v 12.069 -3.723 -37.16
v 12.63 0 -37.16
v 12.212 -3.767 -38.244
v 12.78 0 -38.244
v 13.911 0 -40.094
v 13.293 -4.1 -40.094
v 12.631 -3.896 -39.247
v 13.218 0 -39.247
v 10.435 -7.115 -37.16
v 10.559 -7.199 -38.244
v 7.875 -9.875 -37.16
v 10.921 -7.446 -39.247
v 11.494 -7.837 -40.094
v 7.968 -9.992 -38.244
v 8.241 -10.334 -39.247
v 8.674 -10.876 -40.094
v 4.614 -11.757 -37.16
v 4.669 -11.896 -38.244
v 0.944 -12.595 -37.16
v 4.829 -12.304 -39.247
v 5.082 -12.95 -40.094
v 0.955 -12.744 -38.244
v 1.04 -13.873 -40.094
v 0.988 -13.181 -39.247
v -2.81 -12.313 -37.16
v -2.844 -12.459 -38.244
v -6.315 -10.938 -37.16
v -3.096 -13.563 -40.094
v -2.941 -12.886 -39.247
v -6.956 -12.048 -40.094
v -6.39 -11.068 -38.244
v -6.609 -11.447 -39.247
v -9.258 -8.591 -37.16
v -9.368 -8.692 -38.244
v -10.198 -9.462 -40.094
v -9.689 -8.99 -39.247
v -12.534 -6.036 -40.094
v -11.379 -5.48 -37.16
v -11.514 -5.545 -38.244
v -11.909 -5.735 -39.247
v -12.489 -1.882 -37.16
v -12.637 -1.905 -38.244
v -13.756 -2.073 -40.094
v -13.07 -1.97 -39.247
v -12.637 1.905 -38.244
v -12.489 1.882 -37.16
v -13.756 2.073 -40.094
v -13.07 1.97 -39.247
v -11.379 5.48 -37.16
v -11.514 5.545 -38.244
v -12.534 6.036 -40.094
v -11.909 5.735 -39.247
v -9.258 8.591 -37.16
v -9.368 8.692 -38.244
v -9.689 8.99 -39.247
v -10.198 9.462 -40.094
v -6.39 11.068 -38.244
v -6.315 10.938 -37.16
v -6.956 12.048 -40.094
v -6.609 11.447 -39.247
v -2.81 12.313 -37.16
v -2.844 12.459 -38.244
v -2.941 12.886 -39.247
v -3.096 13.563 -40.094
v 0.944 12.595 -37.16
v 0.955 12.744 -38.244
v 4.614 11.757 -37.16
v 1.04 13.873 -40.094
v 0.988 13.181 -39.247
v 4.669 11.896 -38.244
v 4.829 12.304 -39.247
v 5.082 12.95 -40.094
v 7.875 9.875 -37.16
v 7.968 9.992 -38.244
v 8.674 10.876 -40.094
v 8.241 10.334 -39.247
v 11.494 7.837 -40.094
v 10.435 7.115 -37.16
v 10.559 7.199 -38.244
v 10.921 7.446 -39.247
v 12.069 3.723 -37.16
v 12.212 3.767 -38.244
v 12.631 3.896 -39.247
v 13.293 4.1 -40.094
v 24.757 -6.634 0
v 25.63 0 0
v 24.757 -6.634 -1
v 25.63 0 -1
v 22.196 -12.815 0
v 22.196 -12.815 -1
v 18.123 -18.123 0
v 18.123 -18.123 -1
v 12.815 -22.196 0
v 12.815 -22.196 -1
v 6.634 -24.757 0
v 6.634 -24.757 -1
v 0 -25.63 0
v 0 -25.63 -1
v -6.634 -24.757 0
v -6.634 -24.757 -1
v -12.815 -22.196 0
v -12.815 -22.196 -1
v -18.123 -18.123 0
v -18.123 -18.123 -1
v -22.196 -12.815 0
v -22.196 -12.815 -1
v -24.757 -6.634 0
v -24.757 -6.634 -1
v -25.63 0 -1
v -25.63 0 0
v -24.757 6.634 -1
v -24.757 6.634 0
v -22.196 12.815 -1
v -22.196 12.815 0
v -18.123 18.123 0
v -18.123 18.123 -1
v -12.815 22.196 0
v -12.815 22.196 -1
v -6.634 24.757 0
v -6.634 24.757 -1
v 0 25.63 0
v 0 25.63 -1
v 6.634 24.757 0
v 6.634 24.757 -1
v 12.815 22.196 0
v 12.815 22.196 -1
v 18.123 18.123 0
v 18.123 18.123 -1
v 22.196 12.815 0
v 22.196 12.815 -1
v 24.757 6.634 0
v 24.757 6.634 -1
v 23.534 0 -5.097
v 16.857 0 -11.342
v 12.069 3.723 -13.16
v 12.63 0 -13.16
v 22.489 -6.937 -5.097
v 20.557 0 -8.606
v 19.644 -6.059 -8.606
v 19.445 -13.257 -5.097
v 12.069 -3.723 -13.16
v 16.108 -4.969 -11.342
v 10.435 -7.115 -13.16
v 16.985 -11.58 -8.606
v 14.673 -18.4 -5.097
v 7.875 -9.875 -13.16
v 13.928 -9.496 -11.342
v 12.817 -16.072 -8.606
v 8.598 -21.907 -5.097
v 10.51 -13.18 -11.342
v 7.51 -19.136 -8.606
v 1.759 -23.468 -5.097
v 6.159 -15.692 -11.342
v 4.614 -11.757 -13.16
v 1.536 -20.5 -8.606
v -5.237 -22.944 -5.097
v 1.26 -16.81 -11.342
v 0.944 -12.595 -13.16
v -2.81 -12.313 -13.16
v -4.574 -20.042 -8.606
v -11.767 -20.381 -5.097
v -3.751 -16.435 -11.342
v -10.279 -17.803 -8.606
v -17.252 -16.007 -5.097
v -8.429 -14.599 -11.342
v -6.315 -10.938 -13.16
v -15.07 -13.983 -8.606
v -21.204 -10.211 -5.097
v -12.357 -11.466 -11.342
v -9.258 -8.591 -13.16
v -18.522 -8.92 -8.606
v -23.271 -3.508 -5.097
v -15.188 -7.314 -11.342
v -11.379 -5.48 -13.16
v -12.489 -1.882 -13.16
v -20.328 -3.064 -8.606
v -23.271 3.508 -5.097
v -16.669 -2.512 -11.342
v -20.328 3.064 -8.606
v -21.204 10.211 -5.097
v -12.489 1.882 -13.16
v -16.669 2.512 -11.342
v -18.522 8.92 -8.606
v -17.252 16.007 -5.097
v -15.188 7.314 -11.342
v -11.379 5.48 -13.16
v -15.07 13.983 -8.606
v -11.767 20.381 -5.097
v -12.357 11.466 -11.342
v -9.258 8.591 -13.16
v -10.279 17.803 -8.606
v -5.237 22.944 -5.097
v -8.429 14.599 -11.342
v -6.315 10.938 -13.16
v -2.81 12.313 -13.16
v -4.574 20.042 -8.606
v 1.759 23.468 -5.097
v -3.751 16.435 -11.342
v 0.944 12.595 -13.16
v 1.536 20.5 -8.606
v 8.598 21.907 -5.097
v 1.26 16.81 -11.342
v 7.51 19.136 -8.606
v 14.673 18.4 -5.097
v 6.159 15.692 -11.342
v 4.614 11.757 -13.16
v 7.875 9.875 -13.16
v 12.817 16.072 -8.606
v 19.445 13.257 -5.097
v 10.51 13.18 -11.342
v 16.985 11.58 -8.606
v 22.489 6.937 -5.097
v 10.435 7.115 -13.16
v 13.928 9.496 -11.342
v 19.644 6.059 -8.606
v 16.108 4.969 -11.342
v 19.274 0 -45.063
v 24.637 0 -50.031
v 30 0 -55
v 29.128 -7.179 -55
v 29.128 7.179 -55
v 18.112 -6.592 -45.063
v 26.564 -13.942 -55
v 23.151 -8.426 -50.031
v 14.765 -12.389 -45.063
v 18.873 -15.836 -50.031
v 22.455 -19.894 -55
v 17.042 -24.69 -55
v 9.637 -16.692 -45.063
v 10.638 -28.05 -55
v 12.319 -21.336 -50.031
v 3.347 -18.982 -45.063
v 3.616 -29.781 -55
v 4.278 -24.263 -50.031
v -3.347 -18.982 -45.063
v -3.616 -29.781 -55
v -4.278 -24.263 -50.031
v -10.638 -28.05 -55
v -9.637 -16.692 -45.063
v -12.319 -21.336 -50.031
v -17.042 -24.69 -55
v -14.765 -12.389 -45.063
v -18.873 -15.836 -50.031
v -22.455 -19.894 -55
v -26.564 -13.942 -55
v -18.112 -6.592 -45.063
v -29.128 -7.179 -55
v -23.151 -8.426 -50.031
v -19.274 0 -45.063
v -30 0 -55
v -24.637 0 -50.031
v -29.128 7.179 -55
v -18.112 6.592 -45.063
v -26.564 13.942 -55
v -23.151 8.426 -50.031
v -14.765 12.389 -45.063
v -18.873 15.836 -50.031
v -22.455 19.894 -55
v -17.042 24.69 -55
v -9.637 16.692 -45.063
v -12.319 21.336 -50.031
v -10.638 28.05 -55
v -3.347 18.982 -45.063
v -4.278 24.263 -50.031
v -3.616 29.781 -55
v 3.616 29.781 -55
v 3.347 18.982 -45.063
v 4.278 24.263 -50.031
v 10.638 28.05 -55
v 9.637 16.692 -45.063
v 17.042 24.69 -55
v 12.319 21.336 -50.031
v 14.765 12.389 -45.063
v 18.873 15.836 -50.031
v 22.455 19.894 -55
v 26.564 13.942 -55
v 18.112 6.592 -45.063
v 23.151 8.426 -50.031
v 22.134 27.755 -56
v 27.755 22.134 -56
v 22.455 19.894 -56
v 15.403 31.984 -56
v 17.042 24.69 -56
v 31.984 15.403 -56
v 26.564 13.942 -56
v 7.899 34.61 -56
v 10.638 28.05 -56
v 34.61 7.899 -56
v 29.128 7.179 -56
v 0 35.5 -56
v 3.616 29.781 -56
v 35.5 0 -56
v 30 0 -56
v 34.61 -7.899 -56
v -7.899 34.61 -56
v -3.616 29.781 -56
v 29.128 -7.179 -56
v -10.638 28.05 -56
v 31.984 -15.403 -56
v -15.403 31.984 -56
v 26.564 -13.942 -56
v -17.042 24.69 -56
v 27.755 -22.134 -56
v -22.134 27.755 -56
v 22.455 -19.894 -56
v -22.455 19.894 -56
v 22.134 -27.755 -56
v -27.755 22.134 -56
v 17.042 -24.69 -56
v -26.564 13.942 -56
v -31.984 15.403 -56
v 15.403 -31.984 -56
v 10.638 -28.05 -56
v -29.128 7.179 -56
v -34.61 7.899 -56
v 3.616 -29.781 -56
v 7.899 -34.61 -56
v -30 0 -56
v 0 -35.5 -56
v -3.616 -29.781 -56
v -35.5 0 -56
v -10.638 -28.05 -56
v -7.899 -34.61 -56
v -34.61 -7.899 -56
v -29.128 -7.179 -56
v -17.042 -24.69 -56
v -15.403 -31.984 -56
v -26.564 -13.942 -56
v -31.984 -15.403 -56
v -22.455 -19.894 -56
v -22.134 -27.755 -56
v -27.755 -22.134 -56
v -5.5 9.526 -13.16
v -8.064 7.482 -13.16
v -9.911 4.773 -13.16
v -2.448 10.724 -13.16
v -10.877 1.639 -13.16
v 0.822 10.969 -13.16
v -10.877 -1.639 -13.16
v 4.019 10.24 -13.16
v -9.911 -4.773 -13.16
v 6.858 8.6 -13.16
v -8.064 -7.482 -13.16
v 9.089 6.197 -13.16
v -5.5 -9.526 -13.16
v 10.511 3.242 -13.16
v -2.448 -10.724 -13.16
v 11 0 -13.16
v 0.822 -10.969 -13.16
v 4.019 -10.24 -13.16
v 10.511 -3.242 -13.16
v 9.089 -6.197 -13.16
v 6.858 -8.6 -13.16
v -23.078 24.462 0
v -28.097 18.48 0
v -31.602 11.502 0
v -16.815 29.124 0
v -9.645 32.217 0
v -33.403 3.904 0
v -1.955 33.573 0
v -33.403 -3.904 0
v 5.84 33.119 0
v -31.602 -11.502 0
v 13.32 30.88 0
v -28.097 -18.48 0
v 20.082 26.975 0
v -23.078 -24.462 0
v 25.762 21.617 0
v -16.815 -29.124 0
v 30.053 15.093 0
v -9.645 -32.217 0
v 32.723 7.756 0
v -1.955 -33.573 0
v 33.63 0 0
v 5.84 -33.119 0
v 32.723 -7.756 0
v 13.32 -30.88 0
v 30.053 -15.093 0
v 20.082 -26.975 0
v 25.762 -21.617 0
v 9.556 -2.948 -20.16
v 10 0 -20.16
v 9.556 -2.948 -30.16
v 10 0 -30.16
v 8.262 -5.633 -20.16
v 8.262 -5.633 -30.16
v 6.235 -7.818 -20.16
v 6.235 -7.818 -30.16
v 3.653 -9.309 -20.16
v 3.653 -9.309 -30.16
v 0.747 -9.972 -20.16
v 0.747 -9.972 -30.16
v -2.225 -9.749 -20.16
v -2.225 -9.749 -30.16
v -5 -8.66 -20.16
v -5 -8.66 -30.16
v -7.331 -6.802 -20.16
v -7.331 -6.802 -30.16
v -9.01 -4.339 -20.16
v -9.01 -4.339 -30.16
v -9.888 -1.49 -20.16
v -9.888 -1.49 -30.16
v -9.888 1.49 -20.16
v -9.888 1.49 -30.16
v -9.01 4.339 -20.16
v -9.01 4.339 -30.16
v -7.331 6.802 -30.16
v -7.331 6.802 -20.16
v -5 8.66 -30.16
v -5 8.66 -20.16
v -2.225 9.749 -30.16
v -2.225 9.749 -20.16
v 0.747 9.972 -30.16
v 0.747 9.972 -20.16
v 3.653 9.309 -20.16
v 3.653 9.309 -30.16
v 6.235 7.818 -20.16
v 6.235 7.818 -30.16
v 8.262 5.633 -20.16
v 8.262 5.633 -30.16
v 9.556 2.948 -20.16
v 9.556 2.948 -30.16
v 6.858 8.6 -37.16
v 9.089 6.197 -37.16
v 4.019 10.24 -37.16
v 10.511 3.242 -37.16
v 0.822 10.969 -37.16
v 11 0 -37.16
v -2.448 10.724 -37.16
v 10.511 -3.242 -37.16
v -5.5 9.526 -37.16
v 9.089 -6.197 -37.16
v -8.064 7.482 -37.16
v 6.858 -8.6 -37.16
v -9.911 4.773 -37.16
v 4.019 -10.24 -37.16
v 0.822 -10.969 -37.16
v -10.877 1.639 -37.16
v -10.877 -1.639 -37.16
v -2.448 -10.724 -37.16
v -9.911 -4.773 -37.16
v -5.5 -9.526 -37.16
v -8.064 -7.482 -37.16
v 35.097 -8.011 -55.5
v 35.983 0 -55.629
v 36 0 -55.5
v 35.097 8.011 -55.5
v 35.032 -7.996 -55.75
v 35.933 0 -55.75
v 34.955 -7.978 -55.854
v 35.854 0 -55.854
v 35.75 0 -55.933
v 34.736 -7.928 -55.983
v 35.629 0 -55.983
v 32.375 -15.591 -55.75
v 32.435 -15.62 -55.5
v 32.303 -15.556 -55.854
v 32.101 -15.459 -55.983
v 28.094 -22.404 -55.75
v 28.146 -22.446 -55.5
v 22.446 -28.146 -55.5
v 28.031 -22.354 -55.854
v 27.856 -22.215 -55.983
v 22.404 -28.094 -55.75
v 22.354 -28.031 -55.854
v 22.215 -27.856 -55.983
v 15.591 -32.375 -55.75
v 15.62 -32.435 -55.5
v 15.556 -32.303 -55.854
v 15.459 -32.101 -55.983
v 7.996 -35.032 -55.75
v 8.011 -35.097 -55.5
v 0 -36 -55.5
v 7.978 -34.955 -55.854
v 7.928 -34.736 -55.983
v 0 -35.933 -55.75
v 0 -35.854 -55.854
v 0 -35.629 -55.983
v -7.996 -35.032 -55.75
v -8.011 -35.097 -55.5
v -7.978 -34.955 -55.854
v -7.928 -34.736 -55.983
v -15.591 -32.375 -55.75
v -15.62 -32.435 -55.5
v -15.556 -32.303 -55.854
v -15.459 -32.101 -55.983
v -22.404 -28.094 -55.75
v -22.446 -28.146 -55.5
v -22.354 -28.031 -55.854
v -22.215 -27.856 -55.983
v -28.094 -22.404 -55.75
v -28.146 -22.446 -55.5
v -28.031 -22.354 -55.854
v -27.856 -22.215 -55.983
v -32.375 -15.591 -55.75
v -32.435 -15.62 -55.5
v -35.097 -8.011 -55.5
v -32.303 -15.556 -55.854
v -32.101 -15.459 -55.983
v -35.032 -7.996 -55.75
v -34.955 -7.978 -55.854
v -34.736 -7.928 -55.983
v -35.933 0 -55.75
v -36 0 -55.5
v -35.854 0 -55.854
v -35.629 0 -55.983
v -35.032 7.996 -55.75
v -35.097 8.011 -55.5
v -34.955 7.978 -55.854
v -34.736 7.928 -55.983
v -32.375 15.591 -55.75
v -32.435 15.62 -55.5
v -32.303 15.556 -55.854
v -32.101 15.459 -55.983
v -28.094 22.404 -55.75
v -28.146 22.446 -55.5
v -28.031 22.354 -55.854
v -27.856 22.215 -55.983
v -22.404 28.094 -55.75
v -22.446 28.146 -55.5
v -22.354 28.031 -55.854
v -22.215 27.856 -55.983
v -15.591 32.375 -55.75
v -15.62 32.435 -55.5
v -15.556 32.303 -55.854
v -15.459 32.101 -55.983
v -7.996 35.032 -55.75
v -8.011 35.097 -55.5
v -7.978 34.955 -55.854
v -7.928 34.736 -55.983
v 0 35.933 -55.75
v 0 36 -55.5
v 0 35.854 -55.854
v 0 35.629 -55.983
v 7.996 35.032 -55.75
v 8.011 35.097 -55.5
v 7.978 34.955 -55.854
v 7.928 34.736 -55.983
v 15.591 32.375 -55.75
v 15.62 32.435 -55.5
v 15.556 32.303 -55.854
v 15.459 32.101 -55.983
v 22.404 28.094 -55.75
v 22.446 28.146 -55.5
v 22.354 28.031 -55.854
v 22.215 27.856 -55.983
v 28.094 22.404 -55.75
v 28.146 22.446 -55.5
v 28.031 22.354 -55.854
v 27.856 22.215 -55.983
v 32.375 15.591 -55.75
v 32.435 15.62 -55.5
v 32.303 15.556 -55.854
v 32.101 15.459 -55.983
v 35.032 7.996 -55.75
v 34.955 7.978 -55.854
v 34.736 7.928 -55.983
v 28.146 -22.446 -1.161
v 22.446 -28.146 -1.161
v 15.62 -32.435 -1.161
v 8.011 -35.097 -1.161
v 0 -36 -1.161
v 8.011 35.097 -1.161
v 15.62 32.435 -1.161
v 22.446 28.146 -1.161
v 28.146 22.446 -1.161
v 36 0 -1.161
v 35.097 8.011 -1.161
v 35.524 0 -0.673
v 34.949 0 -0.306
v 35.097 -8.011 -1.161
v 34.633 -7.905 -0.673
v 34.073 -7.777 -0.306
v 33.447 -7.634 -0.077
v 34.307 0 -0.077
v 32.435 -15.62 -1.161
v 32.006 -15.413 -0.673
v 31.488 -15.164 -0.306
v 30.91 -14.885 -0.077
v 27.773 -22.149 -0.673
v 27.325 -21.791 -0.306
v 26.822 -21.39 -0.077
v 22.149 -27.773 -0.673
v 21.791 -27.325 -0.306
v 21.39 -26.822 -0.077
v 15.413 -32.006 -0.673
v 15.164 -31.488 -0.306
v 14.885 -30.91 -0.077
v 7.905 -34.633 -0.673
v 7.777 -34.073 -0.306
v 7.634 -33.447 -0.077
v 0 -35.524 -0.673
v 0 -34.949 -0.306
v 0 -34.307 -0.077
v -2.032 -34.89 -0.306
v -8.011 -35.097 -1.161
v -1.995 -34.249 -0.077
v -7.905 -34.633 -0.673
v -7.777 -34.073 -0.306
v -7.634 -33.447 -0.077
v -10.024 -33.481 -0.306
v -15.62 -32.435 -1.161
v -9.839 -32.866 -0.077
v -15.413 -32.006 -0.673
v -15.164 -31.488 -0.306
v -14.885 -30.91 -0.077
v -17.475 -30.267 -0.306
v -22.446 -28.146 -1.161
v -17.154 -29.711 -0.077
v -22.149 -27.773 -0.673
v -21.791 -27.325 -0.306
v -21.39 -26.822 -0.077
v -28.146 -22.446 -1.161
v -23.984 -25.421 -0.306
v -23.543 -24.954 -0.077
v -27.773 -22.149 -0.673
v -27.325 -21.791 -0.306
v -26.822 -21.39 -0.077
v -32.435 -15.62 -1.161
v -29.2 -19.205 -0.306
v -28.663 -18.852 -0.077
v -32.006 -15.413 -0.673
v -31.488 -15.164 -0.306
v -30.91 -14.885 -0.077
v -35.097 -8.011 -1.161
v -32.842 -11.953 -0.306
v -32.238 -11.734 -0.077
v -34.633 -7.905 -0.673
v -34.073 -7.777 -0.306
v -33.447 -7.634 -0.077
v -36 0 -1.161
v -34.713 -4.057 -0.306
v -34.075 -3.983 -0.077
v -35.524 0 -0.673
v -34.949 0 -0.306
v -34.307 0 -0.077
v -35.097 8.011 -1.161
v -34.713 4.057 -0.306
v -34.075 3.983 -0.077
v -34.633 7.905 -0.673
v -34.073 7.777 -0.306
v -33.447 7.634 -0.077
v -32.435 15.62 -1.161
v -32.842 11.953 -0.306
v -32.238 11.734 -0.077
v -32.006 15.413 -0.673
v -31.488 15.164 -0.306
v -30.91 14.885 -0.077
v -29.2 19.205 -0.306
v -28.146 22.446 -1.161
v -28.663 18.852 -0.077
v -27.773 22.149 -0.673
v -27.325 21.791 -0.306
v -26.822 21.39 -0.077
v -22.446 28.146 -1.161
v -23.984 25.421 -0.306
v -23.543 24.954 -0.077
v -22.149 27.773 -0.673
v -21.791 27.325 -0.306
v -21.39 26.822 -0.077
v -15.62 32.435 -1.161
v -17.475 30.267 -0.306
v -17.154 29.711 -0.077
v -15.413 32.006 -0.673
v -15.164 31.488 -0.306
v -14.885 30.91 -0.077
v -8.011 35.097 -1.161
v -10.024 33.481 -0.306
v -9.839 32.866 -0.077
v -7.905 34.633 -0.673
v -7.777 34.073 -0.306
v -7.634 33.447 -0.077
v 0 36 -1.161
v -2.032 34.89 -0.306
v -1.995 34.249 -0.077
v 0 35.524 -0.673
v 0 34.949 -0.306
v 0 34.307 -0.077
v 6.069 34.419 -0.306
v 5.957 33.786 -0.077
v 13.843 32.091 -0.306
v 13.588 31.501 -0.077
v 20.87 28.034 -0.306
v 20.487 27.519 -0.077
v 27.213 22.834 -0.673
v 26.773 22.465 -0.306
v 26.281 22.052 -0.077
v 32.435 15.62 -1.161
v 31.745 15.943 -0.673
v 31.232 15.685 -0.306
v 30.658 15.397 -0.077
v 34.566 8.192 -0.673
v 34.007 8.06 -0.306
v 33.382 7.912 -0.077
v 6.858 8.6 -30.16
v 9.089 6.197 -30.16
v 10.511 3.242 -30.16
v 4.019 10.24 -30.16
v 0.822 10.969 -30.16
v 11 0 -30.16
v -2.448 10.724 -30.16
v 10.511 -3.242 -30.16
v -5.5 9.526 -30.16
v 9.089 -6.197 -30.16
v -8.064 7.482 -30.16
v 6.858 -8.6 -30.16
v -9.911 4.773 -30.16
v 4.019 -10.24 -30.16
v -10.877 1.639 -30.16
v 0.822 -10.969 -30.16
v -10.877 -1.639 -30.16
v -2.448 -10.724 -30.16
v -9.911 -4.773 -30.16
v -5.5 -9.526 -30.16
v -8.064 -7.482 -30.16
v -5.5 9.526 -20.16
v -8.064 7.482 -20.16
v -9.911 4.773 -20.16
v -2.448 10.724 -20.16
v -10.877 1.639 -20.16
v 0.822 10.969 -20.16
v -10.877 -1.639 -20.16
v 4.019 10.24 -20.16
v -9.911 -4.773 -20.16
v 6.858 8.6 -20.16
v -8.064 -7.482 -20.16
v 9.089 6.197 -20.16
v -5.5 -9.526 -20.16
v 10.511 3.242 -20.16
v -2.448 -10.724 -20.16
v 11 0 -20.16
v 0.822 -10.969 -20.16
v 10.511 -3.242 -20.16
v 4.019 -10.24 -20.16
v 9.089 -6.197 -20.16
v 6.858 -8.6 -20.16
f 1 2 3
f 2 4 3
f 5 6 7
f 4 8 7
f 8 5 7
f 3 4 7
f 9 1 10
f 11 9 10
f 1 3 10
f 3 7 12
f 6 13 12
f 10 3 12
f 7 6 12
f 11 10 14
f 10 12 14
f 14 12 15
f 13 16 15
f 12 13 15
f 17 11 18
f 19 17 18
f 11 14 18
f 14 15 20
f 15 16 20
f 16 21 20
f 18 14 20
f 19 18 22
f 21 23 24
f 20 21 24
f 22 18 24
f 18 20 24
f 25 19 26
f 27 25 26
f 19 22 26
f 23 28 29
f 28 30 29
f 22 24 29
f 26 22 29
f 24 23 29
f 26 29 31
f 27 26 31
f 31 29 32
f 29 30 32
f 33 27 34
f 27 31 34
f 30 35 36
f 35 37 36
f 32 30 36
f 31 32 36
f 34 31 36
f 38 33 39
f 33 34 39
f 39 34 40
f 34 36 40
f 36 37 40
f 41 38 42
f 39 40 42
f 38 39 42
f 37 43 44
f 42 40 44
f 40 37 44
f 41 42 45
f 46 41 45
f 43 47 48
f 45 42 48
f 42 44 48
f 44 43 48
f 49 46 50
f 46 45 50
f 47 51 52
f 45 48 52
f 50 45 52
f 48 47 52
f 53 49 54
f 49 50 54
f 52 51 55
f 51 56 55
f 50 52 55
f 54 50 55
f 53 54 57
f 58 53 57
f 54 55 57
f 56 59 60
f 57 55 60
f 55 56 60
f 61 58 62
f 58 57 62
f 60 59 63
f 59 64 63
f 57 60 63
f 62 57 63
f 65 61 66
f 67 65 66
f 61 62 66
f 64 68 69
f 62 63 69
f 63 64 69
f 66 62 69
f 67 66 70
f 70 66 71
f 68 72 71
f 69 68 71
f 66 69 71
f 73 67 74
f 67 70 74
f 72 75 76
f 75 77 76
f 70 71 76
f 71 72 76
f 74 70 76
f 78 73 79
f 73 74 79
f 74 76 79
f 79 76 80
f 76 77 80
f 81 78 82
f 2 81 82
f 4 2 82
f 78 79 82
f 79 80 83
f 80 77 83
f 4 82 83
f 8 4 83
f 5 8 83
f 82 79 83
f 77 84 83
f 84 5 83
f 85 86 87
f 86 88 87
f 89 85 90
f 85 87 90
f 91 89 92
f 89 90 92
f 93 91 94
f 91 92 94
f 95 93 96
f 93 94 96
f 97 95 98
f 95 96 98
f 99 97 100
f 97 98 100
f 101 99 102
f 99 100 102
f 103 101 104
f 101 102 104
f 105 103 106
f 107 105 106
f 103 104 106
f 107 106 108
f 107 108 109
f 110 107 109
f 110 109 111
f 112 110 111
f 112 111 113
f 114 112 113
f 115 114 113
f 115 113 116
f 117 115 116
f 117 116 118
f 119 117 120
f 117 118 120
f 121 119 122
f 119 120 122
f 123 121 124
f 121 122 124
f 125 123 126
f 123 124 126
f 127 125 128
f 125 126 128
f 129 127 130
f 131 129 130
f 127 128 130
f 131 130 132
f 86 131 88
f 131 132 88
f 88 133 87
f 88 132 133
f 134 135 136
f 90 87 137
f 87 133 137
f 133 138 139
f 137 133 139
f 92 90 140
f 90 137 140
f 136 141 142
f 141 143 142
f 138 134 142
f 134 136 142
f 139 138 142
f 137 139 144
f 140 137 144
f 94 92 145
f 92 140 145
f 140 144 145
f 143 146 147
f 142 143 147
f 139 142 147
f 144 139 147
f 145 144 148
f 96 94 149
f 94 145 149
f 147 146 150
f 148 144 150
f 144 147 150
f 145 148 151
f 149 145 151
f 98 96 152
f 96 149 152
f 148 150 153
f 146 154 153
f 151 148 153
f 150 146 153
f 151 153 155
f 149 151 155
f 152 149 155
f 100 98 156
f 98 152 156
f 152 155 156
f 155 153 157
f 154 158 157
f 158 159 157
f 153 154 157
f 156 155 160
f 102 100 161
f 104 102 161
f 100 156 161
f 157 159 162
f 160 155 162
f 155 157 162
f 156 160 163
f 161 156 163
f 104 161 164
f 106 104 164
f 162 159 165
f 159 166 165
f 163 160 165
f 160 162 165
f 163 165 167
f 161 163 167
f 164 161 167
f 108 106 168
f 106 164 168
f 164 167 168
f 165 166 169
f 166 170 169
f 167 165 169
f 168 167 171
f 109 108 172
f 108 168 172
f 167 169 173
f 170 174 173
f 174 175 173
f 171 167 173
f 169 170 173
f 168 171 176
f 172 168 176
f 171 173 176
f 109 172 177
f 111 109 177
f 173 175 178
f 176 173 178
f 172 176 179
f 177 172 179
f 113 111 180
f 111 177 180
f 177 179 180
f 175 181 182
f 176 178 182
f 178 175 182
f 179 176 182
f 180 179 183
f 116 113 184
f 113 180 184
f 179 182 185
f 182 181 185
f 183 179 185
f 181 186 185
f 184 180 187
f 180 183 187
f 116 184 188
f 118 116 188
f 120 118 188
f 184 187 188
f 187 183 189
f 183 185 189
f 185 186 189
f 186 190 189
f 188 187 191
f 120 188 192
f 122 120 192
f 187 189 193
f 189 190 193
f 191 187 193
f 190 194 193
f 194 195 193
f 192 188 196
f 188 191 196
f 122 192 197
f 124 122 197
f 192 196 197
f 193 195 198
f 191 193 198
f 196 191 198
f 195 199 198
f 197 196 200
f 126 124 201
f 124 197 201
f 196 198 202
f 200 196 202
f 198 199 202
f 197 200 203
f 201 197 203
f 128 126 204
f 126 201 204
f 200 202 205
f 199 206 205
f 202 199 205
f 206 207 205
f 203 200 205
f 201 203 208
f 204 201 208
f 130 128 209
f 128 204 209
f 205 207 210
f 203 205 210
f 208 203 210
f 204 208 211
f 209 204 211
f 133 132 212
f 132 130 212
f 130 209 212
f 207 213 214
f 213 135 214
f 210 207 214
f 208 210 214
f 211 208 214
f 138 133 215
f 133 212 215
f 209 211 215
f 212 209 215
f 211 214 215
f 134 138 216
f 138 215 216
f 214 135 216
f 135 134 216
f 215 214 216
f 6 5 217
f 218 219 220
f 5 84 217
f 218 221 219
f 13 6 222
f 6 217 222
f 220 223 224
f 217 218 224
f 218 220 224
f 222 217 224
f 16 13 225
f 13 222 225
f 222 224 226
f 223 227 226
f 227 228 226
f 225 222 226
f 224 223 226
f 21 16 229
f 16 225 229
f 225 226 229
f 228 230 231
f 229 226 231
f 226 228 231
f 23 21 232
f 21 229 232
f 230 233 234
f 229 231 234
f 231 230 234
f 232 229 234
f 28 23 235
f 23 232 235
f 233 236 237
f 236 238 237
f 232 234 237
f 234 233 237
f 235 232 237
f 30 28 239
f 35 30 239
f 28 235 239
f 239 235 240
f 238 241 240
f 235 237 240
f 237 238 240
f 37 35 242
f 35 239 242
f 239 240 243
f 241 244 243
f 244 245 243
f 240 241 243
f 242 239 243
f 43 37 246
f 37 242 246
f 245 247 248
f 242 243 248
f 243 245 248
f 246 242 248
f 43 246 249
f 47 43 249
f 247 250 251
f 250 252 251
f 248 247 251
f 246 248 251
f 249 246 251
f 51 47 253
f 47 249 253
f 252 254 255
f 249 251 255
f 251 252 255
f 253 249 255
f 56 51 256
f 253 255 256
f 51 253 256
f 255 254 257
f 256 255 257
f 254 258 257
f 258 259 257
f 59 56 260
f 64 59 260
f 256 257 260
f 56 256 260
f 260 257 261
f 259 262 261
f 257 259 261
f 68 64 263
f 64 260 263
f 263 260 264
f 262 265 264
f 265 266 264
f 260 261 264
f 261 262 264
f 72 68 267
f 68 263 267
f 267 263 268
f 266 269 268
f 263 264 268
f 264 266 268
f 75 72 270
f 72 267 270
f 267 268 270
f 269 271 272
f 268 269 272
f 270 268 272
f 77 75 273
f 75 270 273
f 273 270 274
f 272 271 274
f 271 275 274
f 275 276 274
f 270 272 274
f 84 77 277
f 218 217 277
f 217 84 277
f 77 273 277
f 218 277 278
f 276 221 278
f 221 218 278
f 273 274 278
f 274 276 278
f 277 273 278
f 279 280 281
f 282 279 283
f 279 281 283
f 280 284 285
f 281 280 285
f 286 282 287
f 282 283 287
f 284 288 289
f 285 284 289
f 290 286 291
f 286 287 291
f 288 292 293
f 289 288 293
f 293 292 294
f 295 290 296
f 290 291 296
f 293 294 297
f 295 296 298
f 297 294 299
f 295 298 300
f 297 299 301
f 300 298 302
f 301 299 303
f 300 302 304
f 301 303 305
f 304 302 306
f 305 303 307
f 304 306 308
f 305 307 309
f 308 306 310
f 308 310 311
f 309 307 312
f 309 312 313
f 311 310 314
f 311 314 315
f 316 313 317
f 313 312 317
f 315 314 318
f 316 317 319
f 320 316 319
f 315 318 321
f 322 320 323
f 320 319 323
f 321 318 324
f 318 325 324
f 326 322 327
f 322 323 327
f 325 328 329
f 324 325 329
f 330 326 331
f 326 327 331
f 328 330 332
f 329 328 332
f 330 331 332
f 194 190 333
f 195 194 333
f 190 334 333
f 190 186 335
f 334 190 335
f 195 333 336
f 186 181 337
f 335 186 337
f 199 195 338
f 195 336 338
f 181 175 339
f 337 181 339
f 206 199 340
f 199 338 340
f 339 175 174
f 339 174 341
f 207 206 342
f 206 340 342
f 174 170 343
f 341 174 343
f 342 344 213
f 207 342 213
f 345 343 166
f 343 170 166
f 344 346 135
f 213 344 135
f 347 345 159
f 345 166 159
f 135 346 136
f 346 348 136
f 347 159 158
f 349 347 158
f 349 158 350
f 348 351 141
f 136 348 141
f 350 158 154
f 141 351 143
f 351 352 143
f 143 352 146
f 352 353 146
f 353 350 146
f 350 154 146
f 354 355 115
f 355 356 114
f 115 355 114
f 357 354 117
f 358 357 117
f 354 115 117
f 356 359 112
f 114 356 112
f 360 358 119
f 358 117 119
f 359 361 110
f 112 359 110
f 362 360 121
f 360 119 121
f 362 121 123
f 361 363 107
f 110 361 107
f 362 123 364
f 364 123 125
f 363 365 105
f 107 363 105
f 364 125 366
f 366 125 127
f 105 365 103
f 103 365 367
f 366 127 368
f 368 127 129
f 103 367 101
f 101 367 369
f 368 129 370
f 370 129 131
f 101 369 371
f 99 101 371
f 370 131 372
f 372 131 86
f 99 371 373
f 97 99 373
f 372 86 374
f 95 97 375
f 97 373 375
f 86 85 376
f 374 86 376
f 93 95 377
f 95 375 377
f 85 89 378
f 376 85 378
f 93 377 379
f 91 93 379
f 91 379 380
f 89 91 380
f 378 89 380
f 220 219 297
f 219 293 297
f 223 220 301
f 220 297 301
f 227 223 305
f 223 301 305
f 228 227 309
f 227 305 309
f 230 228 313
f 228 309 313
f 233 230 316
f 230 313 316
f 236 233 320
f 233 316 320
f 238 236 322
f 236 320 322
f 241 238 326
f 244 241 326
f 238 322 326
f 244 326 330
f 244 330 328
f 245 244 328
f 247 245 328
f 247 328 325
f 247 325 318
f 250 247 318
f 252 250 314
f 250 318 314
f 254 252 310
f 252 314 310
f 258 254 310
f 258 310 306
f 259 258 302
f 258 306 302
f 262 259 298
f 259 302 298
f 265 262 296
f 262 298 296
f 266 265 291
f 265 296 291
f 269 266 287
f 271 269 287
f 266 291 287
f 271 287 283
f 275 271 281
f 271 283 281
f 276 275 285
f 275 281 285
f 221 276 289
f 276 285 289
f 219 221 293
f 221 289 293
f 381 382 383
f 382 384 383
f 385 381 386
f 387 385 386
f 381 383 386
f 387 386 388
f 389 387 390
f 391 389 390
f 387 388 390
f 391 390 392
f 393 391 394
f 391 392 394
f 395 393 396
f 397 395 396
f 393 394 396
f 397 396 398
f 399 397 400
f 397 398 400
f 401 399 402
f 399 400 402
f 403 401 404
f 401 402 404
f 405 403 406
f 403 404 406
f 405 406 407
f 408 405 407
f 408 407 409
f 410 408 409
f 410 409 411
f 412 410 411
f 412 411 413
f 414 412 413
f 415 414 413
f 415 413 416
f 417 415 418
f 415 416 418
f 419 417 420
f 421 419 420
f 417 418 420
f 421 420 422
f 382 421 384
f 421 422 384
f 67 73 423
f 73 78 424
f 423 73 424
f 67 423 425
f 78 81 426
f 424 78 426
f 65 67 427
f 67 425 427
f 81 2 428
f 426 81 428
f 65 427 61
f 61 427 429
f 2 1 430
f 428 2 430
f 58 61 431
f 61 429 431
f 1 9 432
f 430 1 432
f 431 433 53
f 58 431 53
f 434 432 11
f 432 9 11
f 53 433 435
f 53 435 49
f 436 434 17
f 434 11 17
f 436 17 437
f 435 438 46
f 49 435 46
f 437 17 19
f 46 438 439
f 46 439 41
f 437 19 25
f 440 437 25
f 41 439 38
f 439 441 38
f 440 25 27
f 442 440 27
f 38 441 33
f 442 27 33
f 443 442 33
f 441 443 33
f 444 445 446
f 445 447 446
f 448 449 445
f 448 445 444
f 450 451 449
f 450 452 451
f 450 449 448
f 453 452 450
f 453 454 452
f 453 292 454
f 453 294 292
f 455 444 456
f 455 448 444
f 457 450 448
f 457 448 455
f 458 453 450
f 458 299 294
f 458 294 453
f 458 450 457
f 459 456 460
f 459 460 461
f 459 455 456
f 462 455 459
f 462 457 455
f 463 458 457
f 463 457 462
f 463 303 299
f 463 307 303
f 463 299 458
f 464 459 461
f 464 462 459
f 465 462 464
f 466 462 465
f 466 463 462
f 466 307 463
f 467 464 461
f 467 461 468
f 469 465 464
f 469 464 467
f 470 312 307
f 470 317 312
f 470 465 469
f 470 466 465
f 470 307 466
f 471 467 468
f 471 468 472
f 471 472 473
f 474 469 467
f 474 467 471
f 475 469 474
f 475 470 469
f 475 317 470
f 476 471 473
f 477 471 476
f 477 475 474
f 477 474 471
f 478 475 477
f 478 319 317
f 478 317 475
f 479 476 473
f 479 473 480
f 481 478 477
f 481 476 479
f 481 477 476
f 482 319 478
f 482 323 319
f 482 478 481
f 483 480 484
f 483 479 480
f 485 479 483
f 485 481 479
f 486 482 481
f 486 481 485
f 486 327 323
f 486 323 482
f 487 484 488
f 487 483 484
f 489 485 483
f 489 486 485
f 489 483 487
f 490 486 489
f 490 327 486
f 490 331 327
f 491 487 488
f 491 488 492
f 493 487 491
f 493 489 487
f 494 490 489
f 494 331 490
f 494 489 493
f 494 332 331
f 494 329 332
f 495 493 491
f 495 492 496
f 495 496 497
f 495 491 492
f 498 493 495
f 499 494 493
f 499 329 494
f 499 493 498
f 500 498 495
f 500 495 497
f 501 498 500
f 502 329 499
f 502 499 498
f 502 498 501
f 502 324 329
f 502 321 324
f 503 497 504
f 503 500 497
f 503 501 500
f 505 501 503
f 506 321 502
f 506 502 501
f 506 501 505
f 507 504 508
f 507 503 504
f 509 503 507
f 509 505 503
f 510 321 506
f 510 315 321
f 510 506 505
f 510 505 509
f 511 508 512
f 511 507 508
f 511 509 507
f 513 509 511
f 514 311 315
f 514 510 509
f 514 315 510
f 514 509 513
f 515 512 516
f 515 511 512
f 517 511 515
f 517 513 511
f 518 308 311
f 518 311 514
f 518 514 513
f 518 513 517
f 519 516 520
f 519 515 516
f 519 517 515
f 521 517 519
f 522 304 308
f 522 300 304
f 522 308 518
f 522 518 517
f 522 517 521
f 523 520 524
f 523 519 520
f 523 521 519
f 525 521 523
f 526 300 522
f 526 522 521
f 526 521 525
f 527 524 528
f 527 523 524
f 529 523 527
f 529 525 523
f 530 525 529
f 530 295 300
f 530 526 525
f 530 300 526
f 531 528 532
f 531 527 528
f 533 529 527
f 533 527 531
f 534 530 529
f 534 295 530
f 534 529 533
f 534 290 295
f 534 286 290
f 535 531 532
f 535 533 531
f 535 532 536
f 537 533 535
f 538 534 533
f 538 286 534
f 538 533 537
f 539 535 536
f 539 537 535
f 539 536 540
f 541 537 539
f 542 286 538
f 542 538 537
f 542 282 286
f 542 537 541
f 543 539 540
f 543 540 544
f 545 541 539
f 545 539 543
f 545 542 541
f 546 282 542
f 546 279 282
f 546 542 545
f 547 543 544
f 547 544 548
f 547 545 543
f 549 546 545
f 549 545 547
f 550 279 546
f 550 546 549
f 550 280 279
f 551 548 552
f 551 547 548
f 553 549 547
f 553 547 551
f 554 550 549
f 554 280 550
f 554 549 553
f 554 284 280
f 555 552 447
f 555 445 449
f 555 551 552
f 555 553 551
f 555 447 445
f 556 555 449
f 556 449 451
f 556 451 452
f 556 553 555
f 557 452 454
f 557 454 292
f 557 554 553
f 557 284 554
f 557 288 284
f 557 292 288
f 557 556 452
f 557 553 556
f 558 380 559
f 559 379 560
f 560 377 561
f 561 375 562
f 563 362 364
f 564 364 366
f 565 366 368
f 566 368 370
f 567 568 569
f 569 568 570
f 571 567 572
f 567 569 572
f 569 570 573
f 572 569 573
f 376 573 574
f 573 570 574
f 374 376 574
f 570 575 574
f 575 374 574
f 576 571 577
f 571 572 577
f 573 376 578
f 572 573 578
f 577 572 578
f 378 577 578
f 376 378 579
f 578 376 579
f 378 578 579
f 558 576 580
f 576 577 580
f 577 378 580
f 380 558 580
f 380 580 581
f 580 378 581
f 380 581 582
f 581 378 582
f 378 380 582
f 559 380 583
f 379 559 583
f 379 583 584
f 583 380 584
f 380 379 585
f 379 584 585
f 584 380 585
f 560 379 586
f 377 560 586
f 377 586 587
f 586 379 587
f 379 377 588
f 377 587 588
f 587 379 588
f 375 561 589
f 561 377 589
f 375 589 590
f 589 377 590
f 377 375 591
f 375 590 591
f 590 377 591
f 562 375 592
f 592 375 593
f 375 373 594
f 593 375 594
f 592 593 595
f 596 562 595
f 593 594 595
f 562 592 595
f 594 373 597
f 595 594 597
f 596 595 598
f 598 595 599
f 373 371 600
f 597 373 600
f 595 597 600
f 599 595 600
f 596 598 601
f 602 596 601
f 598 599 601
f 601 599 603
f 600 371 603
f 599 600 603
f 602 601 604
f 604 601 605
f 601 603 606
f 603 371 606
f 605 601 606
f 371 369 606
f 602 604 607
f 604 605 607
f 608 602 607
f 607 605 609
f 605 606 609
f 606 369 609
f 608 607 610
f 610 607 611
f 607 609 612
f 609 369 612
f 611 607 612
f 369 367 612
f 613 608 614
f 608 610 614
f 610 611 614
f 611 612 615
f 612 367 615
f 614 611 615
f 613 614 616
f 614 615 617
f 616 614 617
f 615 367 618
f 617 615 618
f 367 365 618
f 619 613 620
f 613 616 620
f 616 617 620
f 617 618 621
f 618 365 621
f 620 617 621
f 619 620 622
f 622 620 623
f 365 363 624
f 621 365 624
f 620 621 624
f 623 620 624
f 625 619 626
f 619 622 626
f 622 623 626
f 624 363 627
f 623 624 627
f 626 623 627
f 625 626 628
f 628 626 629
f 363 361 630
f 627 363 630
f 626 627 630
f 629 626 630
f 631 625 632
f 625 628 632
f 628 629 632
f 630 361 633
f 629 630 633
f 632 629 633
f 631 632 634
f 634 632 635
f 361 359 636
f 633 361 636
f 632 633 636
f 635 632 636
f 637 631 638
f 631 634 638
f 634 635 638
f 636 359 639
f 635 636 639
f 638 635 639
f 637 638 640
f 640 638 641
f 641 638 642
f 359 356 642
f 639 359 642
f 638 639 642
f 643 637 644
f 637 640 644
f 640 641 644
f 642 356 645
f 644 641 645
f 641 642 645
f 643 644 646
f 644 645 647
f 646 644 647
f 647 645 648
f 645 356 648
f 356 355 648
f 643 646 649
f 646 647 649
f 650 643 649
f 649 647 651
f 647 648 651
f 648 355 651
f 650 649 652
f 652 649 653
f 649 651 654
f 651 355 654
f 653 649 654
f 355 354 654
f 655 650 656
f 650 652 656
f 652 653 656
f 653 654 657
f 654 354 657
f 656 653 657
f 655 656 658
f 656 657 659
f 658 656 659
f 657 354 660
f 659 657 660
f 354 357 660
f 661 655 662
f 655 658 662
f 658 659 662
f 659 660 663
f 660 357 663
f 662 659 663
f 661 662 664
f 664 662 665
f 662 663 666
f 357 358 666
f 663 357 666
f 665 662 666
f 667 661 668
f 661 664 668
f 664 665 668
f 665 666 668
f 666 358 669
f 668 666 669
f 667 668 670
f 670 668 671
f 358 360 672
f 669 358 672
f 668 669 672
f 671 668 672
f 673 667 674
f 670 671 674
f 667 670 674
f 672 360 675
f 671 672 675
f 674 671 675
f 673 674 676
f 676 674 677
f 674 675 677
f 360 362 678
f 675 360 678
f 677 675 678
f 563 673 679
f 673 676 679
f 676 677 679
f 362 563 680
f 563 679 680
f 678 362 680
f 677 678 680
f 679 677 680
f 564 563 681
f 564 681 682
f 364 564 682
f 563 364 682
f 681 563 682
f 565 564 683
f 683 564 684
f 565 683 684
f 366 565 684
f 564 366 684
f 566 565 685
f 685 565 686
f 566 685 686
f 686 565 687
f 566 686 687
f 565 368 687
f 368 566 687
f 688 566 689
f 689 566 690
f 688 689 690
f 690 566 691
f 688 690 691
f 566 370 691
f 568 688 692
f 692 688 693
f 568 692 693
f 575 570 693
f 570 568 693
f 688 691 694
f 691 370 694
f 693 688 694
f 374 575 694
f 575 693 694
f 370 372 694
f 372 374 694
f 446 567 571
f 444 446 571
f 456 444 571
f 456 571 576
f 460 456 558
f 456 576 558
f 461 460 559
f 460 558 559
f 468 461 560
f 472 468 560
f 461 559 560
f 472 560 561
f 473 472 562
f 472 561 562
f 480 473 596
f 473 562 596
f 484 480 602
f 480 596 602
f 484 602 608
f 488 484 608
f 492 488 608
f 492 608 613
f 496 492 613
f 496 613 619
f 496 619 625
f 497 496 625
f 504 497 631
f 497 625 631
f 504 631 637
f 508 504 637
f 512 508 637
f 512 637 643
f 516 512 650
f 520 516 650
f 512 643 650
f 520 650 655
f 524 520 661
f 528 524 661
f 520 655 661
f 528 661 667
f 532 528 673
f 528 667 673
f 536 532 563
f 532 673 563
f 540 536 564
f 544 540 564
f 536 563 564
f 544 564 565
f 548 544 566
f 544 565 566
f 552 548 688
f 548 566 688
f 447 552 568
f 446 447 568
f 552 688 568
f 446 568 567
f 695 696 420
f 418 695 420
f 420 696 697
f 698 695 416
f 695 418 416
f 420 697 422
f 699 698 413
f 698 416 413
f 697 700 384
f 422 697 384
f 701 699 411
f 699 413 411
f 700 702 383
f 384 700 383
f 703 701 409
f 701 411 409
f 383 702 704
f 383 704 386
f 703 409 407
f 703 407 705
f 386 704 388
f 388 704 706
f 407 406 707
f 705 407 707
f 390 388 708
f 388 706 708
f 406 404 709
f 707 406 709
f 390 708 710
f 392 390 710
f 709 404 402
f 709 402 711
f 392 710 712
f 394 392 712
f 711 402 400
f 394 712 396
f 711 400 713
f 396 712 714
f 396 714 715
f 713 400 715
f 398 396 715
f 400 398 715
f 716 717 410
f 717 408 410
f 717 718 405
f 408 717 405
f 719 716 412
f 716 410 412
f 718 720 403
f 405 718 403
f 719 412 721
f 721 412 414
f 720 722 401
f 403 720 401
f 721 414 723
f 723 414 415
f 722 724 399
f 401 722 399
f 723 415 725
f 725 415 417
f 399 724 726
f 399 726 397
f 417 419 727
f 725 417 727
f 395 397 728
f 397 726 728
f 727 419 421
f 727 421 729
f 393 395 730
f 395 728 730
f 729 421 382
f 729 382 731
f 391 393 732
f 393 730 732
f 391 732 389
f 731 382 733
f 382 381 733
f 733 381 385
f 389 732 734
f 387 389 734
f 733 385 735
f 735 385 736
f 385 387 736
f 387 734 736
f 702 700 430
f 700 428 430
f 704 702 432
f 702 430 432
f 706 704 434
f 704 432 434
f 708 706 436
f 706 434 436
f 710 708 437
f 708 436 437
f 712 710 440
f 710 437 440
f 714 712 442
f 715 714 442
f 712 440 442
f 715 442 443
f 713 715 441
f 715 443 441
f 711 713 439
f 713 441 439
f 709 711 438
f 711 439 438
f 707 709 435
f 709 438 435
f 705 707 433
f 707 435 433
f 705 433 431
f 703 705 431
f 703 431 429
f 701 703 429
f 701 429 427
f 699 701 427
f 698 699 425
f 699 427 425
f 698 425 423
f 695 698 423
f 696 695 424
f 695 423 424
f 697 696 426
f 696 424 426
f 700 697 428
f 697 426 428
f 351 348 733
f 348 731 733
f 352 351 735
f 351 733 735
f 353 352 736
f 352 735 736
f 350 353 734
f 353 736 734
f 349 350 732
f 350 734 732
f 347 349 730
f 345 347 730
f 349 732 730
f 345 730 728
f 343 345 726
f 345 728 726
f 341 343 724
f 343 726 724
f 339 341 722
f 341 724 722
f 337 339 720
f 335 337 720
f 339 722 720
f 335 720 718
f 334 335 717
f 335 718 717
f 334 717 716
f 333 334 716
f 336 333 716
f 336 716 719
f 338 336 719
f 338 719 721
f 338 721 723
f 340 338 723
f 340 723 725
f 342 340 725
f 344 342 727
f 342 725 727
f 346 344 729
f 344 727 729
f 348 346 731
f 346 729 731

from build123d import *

# Parameters (mm, degrees)
FILLET1_R = 0.5


with BuildPart() as part:
    # Sketch1 → Revolve1 (revolve)
    with BuildSketch(Plane(origin=(0, 0, 0), x_dir=(1, 0, 0), z_dir=(0, 1, 0))):
        with BuildLine():
            Line((36, 56), (36, 1.160679473))
            ThreePointArc((36, 1.160679473), (34.94947687, 0.305750422), (33.63, 0))
            Line((33.63, 0), (25.63, 0))
            Line((25.63, 0), (25.63, 1))
            ThreePointArc((25.63, 1), (20.557422009, 8.606026819), (12.63, 13.16))
            Line((12.63, 13.16), (11, 13.16))
            Line((11, 13.16), (11, 20.16))
            Line((11, 20.16), (10, 20.16))
            Line((10, 20.16), (10, 30.16))
            Line((10, 30.16), (11, 30.16))
            Line((11, 30.16), (11, 37.16))
            Line((11, 37.16), (12.63, 37.16))
            ThreePointArc((12.63, 37.16), (12.964344278, 38.760927271), (13.911484064, 40.094224107))
            Line((13.911484064, 40.094224107), (30, 55))
            Line((30, 55), (30, 56))
            Line((30, 56), (36, 56))
        make_face()
    revolve(axis=Axis((0, 0, 0), (0, 0, -1)))

    # Fillet1
    fillet1_edges = [part.edges().sort_by_distance(p)[0] for p in [
        (-36, 0, -56),
    ]]
    fillet(fillet1_edges, radius=FILLET1_R)


solid = part.part
